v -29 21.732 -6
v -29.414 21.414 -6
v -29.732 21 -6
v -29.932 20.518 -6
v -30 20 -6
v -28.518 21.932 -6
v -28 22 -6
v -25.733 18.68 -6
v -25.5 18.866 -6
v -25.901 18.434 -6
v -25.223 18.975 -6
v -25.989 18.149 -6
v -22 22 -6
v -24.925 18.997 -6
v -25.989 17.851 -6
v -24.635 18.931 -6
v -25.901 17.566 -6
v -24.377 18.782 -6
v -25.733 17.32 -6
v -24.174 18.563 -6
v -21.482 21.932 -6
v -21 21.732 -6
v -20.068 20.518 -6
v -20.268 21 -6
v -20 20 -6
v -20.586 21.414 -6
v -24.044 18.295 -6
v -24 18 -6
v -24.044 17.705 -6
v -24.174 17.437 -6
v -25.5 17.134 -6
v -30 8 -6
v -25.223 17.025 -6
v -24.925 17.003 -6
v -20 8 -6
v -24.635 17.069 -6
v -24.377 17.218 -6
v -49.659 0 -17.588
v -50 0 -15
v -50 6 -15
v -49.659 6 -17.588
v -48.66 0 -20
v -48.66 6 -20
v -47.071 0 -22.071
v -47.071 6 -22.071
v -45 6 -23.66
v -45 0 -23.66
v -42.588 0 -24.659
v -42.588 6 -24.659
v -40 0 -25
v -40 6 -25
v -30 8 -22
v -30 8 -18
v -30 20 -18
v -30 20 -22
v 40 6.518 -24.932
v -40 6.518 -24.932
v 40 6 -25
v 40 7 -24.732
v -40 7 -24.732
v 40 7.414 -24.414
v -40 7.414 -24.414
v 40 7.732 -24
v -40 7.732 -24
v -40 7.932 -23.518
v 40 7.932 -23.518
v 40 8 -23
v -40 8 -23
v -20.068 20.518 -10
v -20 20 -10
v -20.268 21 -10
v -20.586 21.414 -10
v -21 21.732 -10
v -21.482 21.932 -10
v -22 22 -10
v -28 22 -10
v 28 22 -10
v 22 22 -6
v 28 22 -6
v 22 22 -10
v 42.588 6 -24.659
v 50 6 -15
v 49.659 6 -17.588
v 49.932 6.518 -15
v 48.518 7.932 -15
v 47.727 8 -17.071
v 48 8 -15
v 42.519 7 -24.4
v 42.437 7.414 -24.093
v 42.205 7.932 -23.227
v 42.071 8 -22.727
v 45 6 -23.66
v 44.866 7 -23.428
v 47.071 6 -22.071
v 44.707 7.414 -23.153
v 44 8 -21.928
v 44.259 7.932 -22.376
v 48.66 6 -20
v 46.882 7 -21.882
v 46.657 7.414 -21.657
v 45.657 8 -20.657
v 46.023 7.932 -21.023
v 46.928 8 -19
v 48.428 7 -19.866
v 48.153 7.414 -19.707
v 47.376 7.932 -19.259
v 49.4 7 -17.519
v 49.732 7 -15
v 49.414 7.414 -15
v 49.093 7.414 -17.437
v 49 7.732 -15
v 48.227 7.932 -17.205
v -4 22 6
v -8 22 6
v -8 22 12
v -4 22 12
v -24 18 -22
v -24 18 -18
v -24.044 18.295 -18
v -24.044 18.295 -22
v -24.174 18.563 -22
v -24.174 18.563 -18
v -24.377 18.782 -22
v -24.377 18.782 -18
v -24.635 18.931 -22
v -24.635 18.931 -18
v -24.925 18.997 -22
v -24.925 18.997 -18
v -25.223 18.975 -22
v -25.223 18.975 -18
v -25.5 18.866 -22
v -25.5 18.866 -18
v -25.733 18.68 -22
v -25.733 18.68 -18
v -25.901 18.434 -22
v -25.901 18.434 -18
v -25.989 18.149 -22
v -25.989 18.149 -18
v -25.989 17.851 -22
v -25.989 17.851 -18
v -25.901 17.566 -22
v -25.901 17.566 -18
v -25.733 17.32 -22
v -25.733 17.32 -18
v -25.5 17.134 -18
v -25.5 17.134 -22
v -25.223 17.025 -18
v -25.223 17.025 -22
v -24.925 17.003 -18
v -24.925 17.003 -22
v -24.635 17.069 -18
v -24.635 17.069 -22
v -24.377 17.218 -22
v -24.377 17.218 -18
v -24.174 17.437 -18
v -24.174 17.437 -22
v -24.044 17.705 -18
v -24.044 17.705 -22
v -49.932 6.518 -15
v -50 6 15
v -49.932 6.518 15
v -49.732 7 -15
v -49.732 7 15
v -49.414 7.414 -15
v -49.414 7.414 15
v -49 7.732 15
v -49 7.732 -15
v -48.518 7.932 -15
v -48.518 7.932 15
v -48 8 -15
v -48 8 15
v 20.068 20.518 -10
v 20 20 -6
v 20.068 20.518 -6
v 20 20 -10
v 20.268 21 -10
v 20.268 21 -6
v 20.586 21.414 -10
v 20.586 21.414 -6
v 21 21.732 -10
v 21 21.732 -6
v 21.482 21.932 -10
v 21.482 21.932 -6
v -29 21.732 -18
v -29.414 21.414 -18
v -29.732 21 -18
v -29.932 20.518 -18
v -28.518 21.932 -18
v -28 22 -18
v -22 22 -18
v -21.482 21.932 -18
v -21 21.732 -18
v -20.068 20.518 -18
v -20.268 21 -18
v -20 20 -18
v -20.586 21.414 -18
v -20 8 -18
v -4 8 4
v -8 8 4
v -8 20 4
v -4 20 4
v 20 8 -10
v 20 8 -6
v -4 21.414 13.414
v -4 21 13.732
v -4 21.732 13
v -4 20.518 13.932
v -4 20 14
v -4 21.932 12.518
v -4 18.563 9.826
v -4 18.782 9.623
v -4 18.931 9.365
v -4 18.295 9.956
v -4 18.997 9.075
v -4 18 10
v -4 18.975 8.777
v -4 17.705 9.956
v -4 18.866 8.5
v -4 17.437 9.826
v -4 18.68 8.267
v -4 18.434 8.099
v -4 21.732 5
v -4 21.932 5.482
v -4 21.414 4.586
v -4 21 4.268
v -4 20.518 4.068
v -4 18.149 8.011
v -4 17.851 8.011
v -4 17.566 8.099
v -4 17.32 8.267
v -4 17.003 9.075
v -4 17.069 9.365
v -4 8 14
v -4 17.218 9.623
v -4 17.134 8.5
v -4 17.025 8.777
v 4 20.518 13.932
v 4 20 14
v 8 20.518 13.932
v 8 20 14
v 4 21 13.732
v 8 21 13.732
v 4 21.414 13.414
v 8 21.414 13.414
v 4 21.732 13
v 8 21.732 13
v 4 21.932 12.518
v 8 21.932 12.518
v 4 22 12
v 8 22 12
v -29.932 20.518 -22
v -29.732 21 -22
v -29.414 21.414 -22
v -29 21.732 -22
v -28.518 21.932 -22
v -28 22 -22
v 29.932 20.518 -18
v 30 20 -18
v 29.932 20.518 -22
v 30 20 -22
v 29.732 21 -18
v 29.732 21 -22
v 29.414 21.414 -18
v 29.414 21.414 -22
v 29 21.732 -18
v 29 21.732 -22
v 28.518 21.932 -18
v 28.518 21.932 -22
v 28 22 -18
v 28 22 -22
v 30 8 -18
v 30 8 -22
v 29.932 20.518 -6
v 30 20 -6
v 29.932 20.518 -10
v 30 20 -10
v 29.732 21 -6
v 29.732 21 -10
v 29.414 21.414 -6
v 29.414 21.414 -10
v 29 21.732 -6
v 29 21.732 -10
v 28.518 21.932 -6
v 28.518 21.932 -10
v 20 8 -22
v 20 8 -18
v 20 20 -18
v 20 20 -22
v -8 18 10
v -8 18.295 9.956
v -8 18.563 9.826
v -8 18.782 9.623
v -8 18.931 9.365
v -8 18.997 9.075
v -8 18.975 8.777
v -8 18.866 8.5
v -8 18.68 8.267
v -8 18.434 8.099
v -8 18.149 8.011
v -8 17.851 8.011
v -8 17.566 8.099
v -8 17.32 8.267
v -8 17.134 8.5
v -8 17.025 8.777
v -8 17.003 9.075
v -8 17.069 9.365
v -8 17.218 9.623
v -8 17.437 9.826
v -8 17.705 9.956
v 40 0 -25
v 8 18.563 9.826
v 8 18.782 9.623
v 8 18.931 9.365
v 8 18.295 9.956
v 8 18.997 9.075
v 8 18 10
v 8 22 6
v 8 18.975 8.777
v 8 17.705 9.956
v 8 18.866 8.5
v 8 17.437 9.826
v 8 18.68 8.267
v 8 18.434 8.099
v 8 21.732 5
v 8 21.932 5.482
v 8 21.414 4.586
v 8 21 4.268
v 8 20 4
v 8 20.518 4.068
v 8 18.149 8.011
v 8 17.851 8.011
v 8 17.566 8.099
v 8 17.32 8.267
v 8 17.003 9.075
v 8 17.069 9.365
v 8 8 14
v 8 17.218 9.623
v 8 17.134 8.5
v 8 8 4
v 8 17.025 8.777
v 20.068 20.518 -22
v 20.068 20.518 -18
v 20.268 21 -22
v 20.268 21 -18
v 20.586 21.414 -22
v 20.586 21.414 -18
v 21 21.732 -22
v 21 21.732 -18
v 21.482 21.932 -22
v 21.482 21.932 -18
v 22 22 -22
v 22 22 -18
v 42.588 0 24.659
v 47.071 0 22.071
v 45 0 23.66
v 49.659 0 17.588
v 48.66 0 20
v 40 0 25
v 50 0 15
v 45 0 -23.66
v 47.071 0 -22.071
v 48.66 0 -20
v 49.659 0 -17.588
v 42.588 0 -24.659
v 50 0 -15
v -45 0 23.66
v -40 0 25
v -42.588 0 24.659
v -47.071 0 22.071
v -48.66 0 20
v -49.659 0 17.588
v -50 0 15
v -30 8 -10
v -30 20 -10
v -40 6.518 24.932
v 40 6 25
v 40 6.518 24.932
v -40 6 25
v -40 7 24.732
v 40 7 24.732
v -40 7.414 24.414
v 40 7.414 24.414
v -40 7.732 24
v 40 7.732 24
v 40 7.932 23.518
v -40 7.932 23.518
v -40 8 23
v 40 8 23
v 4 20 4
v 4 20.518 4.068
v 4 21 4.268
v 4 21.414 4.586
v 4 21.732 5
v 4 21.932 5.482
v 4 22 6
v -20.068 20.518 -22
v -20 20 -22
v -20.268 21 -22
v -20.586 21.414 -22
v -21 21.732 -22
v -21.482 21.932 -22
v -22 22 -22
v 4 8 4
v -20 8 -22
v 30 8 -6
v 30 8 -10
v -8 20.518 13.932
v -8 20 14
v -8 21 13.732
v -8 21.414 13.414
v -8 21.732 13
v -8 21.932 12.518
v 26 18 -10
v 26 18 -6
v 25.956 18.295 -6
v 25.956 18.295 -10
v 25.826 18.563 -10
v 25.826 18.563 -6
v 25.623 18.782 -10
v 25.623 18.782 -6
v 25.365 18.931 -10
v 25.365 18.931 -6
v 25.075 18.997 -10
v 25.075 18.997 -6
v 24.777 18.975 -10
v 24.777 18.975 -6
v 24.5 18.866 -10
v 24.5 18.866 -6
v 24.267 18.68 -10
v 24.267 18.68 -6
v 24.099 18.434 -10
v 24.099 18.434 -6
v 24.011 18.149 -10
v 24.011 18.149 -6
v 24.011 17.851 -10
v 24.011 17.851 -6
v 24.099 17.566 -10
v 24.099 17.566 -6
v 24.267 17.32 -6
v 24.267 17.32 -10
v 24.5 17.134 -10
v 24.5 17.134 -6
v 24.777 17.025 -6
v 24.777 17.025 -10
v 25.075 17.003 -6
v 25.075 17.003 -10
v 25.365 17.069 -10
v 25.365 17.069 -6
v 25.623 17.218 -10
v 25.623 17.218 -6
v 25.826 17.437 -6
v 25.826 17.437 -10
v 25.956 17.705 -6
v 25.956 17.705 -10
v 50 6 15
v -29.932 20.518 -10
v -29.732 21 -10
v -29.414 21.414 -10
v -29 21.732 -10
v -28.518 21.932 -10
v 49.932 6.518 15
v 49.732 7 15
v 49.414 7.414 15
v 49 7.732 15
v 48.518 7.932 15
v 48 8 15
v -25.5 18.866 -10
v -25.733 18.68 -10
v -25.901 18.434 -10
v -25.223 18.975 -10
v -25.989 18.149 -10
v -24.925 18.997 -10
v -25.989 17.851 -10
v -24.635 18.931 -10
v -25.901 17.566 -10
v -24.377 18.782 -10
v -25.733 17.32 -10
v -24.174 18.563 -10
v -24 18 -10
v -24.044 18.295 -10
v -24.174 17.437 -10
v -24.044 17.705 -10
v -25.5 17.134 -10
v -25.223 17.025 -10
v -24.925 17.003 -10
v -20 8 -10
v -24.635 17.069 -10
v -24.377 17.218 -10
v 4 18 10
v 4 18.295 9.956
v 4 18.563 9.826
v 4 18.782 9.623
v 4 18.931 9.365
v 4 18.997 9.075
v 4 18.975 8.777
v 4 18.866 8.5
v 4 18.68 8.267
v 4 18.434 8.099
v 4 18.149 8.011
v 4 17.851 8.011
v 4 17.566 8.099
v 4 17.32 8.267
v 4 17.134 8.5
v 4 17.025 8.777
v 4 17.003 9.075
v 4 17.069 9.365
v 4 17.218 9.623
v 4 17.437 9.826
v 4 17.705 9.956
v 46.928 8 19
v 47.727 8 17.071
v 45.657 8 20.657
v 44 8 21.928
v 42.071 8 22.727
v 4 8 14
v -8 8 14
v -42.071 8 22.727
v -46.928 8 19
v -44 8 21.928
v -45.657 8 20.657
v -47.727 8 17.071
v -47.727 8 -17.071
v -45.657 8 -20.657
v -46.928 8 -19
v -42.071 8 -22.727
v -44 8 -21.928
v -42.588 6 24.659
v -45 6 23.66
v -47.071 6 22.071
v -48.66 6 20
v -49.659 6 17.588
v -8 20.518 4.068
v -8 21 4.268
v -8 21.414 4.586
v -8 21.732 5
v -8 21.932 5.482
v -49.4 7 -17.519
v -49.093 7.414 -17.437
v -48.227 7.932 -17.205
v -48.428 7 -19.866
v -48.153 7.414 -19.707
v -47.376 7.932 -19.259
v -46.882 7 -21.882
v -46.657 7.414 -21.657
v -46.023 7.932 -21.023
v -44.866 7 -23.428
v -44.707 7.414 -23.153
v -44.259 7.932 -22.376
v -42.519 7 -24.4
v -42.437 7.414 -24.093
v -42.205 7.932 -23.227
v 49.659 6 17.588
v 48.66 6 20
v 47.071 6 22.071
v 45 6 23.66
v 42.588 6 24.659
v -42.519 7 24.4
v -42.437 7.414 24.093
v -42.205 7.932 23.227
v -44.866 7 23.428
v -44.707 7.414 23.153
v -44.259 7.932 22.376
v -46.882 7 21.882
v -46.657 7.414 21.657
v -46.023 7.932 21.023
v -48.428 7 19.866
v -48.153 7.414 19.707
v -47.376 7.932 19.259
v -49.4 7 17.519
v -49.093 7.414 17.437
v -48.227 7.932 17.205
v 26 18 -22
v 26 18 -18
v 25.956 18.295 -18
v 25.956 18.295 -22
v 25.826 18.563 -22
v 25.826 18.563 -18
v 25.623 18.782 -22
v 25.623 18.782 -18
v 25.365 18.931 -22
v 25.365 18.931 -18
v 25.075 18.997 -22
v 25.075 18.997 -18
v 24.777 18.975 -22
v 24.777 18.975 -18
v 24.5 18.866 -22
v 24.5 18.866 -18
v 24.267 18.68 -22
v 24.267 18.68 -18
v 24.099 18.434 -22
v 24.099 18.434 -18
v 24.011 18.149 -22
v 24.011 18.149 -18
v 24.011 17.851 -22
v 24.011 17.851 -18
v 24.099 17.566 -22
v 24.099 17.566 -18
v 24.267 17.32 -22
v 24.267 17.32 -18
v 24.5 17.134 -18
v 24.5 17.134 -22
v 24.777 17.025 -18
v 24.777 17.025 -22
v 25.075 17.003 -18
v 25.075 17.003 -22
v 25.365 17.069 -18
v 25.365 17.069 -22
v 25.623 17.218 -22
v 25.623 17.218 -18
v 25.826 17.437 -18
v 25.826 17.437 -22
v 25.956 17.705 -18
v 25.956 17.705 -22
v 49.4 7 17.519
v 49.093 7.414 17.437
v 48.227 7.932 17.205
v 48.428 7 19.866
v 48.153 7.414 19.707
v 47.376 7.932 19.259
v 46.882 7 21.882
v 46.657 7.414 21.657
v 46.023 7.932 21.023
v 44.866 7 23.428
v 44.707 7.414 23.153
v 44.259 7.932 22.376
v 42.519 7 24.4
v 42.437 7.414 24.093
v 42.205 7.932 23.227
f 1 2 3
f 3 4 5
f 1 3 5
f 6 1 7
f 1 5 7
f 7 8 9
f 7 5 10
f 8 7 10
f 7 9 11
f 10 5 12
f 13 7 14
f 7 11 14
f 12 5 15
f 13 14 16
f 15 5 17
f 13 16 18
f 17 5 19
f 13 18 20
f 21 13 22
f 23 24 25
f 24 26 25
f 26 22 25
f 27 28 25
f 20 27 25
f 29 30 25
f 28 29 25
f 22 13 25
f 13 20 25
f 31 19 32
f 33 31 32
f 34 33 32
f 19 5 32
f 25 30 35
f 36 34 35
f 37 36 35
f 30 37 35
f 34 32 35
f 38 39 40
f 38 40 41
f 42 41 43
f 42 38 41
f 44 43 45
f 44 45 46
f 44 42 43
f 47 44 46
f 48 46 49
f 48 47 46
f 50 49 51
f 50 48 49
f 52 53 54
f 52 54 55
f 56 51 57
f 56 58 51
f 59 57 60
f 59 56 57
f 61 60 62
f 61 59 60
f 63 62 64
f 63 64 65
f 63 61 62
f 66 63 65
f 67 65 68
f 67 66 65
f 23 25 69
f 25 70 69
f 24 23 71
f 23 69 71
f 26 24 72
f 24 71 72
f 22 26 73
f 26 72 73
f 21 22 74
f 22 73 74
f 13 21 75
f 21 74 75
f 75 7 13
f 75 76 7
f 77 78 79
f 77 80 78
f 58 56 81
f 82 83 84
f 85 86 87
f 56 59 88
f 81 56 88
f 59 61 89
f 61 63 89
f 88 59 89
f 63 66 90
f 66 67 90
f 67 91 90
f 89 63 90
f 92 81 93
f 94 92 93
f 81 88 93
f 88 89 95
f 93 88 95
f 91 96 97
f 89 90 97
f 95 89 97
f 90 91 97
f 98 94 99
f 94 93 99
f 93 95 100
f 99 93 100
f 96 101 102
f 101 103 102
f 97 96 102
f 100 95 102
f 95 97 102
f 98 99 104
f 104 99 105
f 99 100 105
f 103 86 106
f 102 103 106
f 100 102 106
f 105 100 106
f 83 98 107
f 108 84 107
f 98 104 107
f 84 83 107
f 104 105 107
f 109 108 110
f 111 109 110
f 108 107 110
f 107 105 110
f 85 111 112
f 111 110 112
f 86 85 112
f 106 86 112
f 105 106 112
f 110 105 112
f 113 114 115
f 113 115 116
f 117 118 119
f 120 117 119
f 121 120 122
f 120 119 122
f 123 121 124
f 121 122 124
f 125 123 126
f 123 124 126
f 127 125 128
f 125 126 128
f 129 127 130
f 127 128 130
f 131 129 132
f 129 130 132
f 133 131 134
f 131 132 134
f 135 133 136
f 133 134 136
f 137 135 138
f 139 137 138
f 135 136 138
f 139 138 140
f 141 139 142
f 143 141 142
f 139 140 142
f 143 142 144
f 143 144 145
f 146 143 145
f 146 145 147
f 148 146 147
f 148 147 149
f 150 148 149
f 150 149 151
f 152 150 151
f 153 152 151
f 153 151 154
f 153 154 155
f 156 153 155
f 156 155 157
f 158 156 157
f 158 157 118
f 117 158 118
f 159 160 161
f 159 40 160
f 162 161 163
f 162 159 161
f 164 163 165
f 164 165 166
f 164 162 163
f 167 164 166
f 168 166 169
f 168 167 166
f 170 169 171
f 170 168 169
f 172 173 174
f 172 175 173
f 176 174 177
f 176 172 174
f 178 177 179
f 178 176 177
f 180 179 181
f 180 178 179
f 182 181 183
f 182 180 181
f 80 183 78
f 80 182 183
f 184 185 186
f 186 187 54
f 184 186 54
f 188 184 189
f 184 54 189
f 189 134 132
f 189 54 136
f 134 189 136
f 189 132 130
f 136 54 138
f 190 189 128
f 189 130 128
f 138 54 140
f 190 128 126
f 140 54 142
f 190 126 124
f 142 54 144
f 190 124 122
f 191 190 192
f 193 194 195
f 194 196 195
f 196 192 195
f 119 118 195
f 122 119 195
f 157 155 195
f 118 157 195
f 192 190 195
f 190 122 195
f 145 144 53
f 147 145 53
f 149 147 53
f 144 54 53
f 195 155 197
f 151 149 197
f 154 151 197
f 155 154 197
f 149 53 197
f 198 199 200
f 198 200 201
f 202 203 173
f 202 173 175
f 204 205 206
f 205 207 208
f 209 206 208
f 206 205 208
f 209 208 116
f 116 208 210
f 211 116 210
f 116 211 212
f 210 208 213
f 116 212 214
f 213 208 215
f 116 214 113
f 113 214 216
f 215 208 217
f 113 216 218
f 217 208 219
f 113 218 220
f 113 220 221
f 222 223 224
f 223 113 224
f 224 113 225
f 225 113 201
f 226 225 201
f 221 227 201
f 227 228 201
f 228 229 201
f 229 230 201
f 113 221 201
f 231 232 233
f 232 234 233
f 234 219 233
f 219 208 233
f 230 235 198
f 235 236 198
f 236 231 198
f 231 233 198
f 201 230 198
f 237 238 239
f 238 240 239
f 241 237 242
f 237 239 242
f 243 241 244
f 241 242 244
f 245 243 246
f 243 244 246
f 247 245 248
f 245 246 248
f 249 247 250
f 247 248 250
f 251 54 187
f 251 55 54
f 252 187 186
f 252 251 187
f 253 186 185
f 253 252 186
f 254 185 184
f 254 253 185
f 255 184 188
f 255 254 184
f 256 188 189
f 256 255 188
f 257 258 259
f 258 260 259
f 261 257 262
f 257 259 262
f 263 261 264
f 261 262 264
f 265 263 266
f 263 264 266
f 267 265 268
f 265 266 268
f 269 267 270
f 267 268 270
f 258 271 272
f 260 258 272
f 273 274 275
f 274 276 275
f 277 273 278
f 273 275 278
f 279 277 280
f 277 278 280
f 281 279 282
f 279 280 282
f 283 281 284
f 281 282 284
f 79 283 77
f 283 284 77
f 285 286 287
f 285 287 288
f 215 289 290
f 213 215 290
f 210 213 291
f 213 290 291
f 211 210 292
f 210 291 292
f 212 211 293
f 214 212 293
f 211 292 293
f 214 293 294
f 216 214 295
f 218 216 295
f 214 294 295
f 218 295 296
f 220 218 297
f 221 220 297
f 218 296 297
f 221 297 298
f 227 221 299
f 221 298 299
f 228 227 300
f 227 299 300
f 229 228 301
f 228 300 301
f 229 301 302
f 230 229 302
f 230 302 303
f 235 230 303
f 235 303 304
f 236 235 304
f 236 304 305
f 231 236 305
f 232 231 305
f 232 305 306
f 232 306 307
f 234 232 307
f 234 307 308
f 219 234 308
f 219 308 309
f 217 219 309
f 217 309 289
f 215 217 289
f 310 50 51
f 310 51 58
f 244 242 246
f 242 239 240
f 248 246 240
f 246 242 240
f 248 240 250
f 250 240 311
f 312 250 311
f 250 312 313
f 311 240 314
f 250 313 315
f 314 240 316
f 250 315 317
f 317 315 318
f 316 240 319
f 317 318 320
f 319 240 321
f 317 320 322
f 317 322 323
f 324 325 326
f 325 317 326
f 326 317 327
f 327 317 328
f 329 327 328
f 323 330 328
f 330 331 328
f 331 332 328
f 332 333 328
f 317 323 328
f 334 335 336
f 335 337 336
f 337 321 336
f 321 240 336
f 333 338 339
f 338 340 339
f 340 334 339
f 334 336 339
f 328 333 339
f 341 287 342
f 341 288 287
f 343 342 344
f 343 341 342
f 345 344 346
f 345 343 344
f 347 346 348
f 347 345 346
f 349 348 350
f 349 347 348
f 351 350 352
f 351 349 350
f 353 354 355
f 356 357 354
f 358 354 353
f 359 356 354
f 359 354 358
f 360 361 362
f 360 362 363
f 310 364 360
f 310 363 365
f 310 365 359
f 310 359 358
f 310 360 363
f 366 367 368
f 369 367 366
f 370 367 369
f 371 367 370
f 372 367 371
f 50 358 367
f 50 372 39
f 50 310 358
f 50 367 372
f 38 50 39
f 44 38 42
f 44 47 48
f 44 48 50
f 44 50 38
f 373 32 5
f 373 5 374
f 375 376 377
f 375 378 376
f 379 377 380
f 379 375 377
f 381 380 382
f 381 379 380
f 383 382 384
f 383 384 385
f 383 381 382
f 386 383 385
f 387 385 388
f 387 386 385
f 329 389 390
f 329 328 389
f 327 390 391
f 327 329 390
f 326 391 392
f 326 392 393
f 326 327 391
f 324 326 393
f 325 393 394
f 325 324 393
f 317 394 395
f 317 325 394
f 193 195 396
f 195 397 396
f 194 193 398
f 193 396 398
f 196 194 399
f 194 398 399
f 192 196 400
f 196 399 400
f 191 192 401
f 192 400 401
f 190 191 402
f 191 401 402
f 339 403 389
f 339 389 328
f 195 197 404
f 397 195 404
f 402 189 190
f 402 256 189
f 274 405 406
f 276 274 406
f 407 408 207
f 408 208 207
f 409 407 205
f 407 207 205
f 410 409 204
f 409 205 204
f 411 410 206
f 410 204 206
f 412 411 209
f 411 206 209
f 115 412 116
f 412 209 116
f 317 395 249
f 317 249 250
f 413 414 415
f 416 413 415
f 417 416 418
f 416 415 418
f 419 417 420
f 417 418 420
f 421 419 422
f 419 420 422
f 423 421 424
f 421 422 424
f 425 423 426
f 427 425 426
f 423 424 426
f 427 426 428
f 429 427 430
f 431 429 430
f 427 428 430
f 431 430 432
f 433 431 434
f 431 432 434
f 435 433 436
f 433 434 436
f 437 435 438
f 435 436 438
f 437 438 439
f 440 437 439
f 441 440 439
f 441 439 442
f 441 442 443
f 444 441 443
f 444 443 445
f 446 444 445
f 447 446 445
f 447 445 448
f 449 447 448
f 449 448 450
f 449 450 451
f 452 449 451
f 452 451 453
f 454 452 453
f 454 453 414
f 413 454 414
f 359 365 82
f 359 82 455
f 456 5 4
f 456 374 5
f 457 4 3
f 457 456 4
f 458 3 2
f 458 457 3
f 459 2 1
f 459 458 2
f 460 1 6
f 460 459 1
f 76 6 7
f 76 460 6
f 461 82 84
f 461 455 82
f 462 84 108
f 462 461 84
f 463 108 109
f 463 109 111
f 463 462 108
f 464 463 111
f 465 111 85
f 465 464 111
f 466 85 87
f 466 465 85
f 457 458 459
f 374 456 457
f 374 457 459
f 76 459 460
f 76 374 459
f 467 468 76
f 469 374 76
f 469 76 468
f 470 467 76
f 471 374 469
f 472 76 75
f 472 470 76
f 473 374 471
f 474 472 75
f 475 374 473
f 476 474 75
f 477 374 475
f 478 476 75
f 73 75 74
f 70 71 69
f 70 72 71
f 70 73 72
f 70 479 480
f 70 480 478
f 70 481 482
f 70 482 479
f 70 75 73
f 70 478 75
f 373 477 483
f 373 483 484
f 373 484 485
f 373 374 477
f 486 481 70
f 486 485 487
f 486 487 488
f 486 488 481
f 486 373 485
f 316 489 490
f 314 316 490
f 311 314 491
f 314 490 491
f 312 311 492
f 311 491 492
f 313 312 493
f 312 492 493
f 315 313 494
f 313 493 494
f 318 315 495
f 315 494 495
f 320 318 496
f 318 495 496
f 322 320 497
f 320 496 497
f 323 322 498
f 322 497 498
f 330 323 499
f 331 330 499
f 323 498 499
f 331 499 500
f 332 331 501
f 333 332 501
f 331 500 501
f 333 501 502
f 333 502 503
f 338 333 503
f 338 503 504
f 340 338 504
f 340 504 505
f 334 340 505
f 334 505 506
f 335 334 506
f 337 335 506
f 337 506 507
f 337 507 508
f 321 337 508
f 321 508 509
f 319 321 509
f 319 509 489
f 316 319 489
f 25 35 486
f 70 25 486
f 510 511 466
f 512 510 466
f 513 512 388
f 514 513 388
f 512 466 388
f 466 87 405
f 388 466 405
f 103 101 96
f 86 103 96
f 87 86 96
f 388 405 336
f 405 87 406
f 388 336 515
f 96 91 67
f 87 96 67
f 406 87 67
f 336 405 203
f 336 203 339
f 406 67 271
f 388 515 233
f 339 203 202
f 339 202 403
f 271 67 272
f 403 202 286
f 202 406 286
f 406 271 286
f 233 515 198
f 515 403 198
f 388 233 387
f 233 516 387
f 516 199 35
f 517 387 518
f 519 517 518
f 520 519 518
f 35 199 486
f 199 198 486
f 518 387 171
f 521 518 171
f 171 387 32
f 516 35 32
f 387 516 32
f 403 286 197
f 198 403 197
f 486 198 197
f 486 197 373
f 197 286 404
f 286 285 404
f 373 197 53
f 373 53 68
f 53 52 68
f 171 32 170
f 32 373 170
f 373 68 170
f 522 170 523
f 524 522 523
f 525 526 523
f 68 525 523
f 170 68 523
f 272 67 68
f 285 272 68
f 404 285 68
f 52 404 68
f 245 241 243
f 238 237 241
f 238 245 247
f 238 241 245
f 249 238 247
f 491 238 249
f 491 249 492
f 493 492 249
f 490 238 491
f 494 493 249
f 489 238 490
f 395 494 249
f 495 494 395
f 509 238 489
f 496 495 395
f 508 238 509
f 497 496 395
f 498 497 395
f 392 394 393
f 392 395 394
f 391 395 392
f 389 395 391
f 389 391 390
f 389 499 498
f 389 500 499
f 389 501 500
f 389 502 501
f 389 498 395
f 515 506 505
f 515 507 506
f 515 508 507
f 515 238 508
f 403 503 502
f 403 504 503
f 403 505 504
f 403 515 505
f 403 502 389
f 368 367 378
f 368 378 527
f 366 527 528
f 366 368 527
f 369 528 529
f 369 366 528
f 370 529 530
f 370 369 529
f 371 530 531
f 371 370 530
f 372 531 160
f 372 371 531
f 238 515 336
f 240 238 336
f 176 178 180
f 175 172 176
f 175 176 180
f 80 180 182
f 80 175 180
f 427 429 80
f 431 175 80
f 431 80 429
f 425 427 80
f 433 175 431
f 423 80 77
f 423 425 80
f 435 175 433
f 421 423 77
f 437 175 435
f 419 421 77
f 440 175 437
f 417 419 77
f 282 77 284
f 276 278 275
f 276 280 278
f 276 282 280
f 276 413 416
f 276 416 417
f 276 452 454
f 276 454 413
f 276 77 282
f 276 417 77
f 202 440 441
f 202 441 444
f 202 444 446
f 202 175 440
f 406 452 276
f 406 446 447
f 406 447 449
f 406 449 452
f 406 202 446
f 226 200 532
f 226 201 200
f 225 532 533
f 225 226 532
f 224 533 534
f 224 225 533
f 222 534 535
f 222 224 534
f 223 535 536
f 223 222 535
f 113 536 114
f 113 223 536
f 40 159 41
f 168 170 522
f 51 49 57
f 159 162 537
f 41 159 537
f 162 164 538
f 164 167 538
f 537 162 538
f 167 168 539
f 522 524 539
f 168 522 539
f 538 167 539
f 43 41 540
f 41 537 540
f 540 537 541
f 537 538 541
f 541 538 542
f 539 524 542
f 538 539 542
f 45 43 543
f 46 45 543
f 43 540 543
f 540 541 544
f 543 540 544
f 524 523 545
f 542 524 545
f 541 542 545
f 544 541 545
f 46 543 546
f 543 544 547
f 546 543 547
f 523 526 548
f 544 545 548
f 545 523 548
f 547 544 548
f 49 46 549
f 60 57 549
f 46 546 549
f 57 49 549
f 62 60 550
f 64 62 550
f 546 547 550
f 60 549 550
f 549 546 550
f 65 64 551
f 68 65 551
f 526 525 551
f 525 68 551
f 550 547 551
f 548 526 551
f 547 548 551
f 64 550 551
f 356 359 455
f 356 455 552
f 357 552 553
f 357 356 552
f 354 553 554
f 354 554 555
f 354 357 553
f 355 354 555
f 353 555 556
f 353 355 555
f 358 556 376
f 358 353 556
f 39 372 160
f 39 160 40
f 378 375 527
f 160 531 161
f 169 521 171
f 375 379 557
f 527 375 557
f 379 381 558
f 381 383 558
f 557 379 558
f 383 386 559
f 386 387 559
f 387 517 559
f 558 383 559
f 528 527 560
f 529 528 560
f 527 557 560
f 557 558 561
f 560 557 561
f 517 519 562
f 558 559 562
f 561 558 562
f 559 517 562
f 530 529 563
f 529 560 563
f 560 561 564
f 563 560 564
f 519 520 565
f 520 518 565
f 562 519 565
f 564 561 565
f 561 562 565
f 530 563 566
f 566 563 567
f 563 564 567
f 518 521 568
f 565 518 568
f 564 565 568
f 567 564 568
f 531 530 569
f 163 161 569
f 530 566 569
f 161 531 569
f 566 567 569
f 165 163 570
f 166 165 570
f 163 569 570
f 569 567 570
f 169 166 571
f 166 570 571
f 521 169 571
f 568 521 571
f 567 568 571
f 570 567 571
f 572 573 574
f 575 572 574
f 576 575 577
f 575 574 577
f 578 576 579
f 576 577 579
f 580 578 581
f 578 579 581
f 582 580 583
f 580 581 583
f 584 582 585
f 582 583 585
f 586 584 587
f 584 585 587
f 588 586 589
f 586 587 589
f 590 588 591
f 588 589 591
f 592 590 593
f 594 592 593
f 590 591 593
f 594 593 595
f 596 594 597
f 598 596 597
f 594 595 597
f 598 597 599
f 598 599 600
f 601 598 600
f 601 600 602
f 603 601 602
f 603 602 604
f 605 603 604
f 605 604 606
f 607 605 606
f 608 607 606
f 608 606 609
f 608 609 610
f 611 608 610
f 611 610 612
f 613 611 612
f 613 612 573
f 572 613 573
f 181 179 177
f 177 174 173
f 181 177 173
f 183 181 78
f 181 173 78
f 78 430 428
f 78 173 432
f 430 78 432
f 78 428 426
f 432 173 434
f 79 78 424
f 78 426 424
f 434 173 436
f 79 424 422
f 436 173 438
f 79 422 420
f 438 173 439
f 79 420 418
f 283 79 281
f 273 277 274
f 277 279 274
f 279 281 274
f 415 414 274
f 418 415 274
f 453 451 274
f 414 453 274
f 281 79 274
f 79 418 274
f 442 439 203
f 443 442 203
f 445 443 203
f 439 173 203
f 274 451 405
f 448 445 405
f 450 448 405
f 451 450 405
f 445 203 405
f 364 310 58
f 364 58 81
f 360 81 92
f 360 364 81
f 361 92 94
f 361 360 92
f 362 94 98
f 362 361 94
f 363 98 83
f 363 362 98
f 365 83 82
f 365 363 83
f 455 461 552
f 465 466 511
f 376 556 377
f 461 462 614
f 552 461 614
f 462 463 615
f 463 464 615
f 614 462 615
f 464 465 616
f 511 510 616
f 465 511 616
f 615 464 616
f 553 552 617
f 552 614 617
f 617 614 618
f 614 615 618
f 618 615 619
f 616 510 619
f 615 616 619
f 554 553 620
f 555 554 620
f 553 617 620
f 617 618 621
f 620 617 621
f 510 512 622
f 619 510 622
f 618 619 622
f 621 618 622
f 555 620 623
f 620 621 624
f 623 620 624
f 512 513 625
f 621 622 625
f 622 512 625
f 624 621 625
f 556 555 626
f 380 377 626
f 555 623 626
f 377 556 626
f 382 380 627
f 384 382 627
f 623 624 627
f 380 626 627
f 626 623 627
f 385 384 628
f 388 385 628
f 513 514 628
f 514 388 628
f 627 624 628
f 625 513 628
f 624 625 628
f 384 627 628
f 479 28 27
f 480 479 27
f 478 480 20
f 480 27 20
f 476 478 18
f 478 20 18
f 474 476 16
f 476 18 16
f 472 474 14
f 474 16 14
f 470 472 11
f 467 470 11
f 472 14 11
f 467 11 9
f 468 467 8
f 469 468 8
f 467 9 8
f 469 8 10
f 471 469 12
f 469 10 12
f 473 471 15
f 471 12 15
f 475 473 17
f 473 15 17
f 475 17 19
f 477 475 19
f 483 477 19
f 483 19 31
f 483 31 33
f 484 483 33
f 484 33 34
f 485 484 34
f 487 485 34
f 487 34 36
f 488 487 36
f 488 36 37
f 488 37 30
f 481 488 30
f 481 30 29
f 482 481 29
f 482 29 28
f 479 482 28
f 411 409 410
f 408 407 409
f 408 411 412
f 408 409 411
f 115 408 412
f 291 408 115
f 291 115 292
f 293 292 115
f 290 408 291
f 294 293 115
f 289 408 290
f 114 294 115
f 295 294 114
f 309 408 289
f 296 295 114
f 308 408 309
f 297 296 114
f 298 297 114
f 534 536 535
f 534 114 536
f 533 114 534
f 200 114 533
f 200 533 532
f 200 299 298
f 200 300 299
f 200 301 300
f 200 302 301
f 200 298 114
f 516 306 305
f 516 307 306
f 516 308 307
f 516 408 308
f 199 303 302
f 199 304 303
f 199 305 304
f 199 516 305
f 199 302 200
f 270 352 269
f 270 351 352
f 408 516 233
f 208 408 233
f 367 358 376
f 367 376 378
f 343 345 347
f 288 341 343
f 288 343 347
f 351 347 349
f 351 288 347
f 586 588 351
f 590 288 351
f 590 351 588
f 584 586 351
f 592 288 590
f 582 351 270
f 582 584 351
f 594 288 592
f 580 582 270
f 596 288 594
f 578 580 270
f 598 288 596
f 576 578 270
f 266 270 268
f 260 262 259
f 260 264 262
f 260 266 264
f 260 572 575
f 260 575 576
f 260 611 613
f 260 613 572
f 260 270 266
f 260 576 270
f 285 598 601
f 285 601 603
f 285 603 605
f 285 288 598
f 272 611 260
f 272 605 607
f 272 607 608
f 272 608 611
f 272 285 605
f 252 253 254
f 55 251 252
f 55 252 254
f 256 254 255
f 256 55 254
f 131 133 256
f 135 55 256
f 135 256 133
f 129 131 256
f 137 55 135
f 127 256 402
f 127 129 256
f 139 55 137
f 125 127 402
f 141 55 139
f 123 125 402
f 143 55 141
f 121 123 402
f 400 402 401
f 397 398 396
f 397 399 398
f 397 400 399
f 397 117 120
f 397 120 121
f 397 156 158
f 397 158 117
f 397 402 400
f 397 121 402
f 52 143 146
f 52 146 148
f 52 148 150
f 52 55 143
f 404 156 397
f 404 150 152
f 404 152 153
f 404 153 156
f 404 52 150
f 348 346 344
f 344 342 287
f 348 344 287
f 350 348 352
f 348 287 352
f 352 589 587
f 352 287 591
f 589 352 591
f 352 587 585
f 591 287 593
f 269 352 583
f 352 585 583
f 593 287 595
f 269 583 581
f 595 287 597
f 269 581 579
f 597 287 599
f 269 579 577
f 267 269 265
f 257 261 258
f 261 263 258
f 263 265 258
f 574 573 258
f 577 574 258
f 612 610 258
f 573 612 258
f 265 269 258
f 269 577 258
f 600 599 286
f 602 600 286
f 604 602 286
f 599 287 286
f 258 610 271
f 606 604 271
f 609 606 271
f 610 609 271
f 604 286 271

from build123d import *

# Parameters (mm, degrees)
BOSS_EXTRUDE1_DEPTH = 8
SKETCH4_W           = 10
SKETCH4_H           = 4
SKETCH4_W_2         = 4
SKETCH4_H_2         = 10
BOSS_EXTRUDE2_DEPTH = 14
SKETCH5_R           = 1
CUT_EXTRUDE1_DEPTH  = 16
SKETCH6_R           = 1
CUT_EXTRUDE2_DEPTH  = 16
FILLET1_R           = 2


with BuildPart() as part:
    # Sketch3 → Boss-Extrude1 (new body)
    with BuildSketch(Plane(origin=(0, 0, 0), x_dir=(1, 0, 0), z_dir=(0, 1, 0))):
        with BuildLine():
            Line((-40, 25), (40, 25))
            ThreePointArc((40, 25), (47.071067812, 22.071067812), (50, 15))
            Line((50, 15), (50, -15))
            ThreePointArc((50, -15), (47.071067812, -22.071067812), (40, -25))
            Line((40, -25), (-40, -25))
            ThreePointArc((-40, -25), (-47.071067812, -22.071067812), (-50, -15))
            Line((-50, -15), (-50, 15))
            ThreePointArc((-50, 15), (-47.071067812, 22.071067812), (-40, 25))
        make_face()
    extrude(amount=BOSS_EXTRUDE1_DEPTH)

    # Sketch4 → Boss-Extrude2 (add)
    with BuildSketch(Plane(origin=(0, 8, 0), x_dir=(1, 0, 0), z_dir=(0, 1, 0))):
        with Locations((-25, 20)):
            Rectangle(SKETCH4_W, SKETCH4_H)
        with Locations((-25, 8)):
            Rectangle(SKETCH4_W, SKETCH4_H)
        with Locations((-6, -9)):
            Rectangle(SKETCH4_W_2, SKETCH4_H_2)
        with Locations((6, -9)):
            Rectangle(SKETCH4_W_2, SKETCH4_H_2)
        with Locations((25, 8)):
            Rectangle(SKETCH4_W, SKETCH4_H)
        with Locations((25, 20)):
            Rectangle(SKETCH4_W, SKETCH4_H)
    extrude(amount=BOSS_EXTRUDE2_DEPTH)

    # Sketch5 → Cut-Extrude1 (cut)
    with BuildSketch(Plane.XY.offset(-6)):
        with Locations((-25, 18)):
            Circle(SKETCH5_R)
        with Locations((25, 18)):
            Circle(SKETCH5_R)
    extrude(amount=-CUT_EXTRUDE1_DEPTH, mode=Mode.SUBTRACT)

    # Sketch6 → Cut-Extrude2 (cut)
    with BuildSketch(Plane.ZY.offset(8)):
        with Locations((9, 18)):
            Circle(SKETCH6_R)
    extrude(amount=-CUT_EXTRUDE2_DEPTH, mode=Mode.SUBTRACT)

    # Fillet1
    fillet1_edges = [part.edges().sort_by_distance(p)[0] for p in [
        (47.071067812, 8, -22.071067812),
        (0, 8, -25),
        (-47.071067812, 8, -22.071067812),
        (-50, 8, 0),
        (-30, 22, -20),
        (-47.071067812, 8, 22.071067812),
        (-20, 22, -20),
        (0, 8, 25),
        (-30, 22, -8),
        (-20, 22, -8),
        (47.071067812, 8, 22.071067812),
        (-6, 22, 14),
        (-6, 22, 4),
        (6, 22, 4),
        (6, 22, 14),
        (30, 22, -8),
        (20, 22, -8),
        (30, 22, -20),
        (20, 22, -20),
        (50, 8, 0),
    ]]
    fillet(fillet1_edges, radius=FILLET1_R)


solid = part.part
